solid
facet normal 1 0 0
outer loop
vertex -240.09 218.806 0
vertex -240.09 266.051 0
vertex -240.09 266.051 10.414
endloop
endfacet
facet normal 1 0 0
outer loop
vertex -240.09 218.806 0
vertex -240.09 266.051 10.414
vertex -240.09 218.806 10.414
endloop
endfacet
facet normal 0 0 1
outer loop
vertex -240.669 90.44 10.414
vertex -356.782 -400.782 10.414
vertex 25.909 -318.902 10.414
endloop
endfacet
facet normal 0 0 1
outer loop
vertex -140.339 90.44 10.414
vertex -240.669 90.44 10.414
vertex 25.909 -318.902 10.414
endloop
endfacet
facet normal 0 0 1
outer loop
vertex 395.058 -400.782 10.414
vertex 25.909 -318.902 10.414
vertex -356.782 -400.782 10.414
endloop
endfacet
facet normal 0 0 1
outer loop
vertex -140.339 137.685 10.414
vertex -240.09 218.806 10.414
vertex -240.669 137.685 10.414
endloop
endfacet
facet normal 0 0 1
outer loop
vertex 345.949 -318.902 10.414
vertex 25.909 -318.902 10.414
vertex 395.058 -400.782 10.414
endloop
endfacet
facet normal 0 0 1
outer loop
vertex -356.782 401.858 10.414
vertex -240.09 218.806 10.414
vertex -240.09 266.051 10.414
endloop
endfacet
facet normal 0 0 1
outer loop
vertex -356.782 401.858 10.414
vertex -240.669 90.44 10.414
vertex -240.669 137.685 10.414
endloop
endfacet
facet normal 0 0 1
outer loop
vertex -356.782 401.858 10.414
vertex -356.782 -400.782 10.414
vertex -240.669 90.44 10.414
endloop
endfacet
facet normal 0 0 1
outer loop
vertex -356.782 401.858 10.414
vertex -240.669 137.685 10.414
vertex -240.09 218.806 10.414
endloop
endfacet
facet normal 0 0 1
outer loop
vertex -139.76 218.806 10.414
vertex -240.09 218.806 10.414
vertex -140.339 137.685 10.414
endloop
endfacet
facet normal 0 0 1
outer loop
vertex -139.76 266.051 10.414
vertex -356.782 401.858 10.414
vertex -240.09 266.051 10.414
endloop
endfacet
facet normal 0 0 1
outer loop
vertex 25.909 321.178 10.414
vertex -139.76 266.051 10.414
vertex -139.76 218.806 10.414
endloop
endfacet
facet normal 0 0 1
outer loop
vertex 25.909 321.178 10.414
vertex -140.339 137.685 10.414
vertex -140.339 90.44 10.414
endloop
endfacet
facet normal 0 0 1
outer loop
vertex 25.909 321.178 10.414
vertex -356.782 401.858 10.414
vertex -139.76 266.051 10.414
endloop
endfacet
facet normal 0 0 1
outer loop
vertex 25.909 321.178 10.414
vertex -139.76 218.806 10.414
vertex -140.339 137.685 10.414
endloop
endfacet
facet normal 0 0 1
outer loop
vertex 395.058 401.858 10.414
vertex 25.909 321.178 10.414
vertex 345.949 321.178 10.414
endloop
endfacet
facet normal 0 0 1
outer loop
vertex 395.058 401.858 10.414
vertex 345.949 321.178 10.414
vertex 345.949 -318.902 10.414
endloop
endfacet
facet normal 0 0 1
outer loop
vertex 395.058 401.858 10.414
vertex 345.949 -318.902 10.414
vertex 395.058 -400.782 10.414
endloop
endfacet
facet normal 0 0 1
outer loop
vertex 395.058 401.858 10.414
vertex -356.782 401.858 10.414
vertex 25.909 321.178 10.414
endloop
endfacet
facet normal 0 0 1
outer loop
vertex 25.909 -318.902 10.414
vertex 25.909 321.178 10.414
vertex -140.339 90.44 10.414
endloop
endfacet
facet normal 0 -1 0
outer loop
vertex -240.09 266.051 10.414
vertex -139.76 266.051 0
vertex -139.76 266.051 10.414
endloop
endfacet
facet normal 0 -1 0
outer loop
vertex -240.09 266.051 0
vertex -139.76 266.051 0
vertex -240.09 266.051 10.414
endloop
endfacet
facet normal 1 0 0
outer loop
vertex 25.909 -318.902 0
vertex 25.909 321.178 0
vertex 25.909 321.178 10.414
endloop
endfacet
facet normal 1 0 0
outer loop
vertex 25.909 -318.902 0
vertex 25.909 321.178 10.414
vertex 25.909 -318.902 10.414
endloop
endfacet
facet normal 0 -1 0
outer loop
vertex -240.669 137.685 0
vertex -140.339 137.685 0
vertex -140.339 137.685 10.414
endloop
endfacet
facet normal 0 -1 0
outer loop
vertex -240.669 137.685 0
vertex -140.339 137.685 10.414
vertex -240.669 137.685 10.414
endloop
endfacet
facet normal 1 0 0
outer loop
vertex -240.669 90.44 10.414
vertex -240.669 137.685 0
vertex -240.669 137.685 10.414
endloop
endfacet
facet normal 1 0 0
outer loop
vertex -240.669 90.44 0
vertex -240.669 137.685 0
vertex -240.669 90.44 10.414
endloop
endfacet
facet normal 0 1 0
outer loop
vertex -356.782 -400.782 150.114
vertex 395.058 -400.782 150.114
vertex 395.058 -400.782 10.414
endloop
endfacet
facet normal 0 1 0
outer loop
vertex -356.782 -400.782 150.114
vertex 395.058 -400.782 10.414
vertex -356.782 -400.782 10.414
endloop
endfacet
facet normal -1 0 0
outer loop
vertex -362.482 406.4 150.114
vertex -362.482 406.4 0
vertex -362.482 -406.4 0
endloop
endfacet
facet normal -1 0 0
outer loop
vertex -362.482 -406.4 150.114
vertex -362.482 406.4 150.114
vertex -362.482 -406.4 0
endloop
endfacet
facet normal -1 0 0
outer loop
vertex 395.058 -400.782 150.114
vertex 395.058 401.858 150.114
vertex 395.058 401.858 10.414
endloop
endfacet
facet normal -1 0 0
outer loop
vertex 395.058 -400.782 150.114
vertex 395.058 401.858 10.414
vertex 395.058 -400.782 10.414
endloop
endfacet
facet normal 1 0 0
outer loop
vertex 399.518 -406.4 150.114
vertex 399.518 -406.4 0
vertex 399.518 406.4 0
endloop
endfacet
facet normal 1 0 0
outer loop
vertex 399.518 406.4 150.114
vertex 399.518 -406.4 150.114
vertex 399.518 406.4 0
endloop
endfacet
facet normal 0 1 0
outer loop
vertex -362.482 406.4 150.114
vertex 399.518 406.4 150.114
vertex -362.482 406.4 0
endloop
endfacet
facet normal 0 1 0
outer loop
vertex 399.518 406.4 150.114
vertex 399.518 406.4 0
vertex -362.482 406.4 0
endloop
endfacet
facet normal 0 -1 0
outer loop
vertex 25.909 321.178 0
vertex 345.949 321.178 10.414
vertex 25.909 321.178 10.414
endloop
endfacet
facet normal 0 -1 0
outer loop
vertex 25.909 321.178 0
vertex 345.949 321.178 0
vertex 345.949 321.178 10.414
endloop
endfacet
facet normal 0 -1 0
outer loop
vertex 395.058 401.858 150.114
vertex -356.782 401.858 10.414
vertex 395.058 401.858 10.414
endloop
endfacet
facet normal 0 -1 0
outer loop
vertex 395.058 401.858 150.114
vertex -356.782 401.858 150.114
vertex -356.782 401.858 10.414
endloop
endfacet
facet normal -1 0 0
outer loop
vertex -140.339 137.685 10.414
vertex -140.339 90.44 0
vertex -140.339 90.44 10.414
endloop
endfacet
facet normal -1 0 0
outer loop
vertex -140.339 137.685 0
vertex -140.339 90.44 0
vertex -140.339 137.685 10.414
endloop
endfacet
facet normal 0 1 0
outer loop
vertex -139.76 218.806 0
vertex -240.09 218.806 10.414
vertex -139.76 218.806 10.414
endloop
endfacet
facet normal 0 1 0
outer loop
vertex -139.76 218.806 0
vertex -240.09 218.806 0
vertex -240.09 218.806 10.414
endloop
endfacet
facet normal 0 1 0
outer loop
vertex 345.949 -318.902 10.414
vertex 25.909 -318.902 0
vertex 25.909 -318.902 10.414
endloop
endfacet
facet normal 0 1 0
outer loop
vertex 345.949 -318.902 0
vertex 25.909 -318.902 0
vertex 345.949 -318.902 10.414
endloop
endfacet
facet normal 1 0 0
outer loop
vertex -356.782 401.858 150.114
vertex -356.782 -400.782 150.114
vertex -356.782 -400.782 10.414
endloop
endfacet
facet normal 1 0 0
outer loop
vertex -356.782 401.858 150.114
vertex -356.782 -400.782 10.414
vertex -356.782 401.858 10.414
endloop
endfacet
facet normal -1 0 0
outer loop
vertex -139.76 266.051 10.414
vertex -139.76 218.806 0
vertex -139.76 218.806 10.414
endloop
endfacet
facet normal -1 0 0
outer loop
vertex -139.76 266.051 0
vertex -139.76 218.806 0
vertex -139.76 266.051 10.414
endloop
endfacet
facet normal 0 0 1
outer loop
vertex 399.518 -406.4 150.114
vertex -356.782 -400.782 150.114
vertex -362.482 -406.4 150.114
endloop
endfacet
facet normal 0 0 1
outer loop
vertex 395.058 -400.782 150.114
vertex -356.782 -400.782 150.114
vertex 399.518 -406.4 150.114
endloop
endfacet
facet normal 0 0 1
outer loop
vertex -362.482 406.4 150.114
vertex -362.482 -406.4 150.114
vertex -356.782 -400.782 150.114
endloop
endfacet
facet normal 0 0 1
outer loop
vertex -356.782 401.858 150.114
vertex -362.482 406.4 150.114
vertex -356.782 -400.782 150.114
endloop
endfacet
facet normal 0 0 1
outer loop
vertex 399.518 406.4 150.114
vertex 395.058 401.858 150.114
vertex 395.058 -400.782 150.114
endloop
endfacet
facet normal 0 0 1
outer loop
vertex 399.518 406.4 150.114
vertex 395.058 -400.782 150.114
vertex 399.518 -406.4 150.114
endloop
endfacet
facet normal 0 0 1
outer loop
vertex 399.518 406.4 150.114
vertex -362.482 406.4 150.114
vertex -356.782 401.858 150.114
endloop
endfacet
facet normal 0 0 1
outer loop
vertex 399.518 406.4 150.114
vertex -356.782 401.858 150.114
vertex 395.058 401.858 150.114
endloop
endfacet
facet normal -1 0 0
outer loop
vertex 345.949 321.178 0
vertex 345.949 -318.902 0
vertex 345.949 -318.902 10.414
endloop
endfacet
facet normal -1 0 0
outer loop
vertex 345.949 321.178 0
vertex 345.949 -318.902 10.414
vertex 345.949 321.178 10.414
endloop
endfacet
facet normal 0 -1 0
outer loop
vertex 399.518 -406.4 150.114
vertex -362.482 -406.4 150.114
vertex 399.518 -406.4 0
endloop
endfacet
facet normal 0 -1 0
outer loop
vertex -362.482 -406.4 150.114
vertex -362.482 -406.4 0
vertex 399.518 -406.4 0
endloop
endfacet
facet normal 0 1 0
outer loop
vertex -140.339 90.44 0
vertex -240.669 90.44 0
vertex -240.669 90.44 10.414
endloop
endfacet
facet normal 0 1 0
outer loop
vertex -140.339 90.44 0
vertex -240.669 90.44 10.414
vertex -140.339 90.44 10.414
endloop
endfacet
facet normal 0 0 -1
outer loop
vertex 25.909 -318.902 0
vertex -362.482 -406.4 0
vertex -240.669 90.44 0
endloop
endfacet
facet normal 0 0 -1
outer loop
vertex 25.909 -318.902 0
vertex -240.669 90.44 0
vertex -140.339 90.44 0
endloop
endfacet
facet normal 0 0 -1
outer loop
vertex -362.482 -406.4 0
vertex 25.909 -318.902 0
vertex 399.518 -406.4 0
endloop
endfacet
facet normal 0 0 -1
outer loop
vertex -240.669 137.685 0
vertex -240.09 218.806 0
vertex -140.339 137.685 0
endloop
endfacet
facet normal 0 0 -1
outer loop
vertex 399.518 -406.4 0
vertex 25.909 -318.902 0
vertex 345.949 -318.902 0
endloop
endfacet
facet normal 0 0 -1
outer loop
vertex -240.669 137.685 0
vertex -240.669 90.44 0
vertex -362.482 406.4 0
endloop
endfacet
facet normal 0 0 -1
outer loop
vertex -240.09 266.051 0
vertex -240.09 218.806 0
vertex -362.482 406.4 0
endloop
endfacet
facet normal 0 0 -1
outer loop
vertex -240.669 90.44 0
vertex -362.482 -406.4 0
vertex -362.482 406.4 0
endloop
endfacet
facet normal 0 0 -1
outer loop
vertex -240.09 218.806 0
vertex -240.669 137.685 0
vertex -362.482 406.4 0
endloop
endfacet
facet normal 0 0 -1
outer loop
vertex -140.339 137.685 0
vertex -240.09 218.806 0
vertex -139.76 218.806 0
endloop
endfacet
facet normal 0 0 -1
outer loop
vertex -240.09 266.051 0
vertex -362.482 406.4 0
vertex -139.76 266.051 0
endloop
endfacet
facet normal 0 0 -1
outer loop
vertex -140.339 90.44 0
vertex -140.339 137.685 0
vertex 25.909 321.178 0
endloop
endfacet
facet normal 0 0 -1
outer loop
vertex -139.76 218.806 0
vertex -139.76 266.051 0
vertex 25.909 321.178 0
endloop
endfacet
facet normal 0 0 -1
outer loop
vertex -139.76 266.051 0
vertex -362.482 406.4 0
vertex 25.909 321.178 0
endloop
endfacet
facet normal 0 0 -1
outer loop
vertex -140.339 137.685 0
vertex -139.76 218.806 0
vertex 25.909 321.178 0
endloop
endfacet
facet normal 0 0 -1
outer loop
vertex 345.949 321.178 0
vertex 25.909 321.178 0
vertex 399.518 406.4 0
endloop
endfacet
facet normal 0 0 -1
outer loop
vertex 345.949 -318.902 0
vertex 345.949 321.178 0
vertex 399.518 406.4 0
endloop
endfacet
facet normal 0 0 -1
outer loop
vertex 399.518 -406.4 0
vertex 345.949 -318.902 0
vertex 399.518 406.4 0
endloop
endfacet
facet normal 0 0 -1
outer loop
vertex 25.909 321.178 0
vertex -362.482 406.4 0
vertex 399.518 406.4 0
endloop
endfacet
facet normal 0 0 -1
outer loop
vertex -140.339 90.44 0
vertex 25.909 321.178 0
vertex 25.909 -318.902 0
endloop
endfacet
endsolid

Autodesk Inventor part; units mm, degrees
ref_plane "YZ Plane" through (0, 0, 0) normal (1, 0, 0) x (0, 1, 0)
ref_plane "XZ Plane" through (0, 0, 0) normal (0, 1, 0) x (-1, 0, 0)
ref_plane "XY Plane" through (0, 0, 0) normal (0, 0, 1) x (1, 0, 0)
sketch "Sketch1" plane through (0, 0, 0) normal (0, 0, 1) x (1, 0, 0)
  line L0 (-362.4815, -406.4) -> (399.5185, -406.4)
  line L1 (399.5185, -406.4) -> (399.5185, 406.4)
  line L2 (399.5185, 406.4) -> (-362.4815, 406.4)
  line L3 (-362.4815, 406.4) -> (-362.4815, -406.4)
  point P0 (0, 0)
extrude "Extrusion1" add sketch "Sketch1" along normal blind 150.114
sketch "Sketch3" plane through (0, 0, 150.114) normal (0, 0, 1) x (1, 0, 0)
  line L0 (-356.7823, 401.8579) -> (395.0577, 401.8579)
  line L1 (395.0577, 401.8579) -> (395.0577, -400.7821)
  line L2 (395.0577, -400.7821) -> (-356.7823, -400.7821)
  line L3 (-356.7823, -400.7821) -> (-356.7823, 401.8579)
  point P0 (0, 0)
  dimension "d10" = 751.84
  dimension "d11" = 802.64
extrude "Extrusion2" cut sketch "Sketch3" against normal blind 139.7
sketch "Sketch4" plane through (0, 0, 0) normal (0, 0, -1) x (-1, 0, 0)
  line L0 (-345.9489, 321.1782) -> (-25.9089, 321.1782)
  line L1 (-25.9089, 321.1782) -> (-25.9089, -318.9018)
  line L2 (-25.9089, -318.9018) -> (-345.9489, -318.9018)
  line L3 (-345.9489, -318.9018) -> (-345.9489, 321.1782)
  line L4 (140.3393, 137.685) -> (240.6693, 137.685)
  line L5 (240.6693, 137.685) -> (240.6693, 90.4401)
  line L6 (240.6693, 90.4401) -> (140.3393, 90.4401)
  line L7 (140.3393, 90.4401) -> (140.3393, 137.685)
  line L8 (139.7596, 266.0514) -> (240.0896, 266.0514)
  line L9 (240.0896, 266.0514) -> (240.0896, 218.8065)
  line L10 (240.0896, 218.8065) -> (139.7596, 218.8065)
  line L11 (139.7596, 218.8065) -> (139.7596, 266.0514)
  point P0 (0, 0)
  dimension "d17" = 100.33
  dimension "d18" = 47.2449
  dimension "d19" = 100.33
  dimension "d20" = 47.2449
extrude "Extrusion3" cut sketch "Sketch4" against normal blind 279.4
properties part number "tetris body"
